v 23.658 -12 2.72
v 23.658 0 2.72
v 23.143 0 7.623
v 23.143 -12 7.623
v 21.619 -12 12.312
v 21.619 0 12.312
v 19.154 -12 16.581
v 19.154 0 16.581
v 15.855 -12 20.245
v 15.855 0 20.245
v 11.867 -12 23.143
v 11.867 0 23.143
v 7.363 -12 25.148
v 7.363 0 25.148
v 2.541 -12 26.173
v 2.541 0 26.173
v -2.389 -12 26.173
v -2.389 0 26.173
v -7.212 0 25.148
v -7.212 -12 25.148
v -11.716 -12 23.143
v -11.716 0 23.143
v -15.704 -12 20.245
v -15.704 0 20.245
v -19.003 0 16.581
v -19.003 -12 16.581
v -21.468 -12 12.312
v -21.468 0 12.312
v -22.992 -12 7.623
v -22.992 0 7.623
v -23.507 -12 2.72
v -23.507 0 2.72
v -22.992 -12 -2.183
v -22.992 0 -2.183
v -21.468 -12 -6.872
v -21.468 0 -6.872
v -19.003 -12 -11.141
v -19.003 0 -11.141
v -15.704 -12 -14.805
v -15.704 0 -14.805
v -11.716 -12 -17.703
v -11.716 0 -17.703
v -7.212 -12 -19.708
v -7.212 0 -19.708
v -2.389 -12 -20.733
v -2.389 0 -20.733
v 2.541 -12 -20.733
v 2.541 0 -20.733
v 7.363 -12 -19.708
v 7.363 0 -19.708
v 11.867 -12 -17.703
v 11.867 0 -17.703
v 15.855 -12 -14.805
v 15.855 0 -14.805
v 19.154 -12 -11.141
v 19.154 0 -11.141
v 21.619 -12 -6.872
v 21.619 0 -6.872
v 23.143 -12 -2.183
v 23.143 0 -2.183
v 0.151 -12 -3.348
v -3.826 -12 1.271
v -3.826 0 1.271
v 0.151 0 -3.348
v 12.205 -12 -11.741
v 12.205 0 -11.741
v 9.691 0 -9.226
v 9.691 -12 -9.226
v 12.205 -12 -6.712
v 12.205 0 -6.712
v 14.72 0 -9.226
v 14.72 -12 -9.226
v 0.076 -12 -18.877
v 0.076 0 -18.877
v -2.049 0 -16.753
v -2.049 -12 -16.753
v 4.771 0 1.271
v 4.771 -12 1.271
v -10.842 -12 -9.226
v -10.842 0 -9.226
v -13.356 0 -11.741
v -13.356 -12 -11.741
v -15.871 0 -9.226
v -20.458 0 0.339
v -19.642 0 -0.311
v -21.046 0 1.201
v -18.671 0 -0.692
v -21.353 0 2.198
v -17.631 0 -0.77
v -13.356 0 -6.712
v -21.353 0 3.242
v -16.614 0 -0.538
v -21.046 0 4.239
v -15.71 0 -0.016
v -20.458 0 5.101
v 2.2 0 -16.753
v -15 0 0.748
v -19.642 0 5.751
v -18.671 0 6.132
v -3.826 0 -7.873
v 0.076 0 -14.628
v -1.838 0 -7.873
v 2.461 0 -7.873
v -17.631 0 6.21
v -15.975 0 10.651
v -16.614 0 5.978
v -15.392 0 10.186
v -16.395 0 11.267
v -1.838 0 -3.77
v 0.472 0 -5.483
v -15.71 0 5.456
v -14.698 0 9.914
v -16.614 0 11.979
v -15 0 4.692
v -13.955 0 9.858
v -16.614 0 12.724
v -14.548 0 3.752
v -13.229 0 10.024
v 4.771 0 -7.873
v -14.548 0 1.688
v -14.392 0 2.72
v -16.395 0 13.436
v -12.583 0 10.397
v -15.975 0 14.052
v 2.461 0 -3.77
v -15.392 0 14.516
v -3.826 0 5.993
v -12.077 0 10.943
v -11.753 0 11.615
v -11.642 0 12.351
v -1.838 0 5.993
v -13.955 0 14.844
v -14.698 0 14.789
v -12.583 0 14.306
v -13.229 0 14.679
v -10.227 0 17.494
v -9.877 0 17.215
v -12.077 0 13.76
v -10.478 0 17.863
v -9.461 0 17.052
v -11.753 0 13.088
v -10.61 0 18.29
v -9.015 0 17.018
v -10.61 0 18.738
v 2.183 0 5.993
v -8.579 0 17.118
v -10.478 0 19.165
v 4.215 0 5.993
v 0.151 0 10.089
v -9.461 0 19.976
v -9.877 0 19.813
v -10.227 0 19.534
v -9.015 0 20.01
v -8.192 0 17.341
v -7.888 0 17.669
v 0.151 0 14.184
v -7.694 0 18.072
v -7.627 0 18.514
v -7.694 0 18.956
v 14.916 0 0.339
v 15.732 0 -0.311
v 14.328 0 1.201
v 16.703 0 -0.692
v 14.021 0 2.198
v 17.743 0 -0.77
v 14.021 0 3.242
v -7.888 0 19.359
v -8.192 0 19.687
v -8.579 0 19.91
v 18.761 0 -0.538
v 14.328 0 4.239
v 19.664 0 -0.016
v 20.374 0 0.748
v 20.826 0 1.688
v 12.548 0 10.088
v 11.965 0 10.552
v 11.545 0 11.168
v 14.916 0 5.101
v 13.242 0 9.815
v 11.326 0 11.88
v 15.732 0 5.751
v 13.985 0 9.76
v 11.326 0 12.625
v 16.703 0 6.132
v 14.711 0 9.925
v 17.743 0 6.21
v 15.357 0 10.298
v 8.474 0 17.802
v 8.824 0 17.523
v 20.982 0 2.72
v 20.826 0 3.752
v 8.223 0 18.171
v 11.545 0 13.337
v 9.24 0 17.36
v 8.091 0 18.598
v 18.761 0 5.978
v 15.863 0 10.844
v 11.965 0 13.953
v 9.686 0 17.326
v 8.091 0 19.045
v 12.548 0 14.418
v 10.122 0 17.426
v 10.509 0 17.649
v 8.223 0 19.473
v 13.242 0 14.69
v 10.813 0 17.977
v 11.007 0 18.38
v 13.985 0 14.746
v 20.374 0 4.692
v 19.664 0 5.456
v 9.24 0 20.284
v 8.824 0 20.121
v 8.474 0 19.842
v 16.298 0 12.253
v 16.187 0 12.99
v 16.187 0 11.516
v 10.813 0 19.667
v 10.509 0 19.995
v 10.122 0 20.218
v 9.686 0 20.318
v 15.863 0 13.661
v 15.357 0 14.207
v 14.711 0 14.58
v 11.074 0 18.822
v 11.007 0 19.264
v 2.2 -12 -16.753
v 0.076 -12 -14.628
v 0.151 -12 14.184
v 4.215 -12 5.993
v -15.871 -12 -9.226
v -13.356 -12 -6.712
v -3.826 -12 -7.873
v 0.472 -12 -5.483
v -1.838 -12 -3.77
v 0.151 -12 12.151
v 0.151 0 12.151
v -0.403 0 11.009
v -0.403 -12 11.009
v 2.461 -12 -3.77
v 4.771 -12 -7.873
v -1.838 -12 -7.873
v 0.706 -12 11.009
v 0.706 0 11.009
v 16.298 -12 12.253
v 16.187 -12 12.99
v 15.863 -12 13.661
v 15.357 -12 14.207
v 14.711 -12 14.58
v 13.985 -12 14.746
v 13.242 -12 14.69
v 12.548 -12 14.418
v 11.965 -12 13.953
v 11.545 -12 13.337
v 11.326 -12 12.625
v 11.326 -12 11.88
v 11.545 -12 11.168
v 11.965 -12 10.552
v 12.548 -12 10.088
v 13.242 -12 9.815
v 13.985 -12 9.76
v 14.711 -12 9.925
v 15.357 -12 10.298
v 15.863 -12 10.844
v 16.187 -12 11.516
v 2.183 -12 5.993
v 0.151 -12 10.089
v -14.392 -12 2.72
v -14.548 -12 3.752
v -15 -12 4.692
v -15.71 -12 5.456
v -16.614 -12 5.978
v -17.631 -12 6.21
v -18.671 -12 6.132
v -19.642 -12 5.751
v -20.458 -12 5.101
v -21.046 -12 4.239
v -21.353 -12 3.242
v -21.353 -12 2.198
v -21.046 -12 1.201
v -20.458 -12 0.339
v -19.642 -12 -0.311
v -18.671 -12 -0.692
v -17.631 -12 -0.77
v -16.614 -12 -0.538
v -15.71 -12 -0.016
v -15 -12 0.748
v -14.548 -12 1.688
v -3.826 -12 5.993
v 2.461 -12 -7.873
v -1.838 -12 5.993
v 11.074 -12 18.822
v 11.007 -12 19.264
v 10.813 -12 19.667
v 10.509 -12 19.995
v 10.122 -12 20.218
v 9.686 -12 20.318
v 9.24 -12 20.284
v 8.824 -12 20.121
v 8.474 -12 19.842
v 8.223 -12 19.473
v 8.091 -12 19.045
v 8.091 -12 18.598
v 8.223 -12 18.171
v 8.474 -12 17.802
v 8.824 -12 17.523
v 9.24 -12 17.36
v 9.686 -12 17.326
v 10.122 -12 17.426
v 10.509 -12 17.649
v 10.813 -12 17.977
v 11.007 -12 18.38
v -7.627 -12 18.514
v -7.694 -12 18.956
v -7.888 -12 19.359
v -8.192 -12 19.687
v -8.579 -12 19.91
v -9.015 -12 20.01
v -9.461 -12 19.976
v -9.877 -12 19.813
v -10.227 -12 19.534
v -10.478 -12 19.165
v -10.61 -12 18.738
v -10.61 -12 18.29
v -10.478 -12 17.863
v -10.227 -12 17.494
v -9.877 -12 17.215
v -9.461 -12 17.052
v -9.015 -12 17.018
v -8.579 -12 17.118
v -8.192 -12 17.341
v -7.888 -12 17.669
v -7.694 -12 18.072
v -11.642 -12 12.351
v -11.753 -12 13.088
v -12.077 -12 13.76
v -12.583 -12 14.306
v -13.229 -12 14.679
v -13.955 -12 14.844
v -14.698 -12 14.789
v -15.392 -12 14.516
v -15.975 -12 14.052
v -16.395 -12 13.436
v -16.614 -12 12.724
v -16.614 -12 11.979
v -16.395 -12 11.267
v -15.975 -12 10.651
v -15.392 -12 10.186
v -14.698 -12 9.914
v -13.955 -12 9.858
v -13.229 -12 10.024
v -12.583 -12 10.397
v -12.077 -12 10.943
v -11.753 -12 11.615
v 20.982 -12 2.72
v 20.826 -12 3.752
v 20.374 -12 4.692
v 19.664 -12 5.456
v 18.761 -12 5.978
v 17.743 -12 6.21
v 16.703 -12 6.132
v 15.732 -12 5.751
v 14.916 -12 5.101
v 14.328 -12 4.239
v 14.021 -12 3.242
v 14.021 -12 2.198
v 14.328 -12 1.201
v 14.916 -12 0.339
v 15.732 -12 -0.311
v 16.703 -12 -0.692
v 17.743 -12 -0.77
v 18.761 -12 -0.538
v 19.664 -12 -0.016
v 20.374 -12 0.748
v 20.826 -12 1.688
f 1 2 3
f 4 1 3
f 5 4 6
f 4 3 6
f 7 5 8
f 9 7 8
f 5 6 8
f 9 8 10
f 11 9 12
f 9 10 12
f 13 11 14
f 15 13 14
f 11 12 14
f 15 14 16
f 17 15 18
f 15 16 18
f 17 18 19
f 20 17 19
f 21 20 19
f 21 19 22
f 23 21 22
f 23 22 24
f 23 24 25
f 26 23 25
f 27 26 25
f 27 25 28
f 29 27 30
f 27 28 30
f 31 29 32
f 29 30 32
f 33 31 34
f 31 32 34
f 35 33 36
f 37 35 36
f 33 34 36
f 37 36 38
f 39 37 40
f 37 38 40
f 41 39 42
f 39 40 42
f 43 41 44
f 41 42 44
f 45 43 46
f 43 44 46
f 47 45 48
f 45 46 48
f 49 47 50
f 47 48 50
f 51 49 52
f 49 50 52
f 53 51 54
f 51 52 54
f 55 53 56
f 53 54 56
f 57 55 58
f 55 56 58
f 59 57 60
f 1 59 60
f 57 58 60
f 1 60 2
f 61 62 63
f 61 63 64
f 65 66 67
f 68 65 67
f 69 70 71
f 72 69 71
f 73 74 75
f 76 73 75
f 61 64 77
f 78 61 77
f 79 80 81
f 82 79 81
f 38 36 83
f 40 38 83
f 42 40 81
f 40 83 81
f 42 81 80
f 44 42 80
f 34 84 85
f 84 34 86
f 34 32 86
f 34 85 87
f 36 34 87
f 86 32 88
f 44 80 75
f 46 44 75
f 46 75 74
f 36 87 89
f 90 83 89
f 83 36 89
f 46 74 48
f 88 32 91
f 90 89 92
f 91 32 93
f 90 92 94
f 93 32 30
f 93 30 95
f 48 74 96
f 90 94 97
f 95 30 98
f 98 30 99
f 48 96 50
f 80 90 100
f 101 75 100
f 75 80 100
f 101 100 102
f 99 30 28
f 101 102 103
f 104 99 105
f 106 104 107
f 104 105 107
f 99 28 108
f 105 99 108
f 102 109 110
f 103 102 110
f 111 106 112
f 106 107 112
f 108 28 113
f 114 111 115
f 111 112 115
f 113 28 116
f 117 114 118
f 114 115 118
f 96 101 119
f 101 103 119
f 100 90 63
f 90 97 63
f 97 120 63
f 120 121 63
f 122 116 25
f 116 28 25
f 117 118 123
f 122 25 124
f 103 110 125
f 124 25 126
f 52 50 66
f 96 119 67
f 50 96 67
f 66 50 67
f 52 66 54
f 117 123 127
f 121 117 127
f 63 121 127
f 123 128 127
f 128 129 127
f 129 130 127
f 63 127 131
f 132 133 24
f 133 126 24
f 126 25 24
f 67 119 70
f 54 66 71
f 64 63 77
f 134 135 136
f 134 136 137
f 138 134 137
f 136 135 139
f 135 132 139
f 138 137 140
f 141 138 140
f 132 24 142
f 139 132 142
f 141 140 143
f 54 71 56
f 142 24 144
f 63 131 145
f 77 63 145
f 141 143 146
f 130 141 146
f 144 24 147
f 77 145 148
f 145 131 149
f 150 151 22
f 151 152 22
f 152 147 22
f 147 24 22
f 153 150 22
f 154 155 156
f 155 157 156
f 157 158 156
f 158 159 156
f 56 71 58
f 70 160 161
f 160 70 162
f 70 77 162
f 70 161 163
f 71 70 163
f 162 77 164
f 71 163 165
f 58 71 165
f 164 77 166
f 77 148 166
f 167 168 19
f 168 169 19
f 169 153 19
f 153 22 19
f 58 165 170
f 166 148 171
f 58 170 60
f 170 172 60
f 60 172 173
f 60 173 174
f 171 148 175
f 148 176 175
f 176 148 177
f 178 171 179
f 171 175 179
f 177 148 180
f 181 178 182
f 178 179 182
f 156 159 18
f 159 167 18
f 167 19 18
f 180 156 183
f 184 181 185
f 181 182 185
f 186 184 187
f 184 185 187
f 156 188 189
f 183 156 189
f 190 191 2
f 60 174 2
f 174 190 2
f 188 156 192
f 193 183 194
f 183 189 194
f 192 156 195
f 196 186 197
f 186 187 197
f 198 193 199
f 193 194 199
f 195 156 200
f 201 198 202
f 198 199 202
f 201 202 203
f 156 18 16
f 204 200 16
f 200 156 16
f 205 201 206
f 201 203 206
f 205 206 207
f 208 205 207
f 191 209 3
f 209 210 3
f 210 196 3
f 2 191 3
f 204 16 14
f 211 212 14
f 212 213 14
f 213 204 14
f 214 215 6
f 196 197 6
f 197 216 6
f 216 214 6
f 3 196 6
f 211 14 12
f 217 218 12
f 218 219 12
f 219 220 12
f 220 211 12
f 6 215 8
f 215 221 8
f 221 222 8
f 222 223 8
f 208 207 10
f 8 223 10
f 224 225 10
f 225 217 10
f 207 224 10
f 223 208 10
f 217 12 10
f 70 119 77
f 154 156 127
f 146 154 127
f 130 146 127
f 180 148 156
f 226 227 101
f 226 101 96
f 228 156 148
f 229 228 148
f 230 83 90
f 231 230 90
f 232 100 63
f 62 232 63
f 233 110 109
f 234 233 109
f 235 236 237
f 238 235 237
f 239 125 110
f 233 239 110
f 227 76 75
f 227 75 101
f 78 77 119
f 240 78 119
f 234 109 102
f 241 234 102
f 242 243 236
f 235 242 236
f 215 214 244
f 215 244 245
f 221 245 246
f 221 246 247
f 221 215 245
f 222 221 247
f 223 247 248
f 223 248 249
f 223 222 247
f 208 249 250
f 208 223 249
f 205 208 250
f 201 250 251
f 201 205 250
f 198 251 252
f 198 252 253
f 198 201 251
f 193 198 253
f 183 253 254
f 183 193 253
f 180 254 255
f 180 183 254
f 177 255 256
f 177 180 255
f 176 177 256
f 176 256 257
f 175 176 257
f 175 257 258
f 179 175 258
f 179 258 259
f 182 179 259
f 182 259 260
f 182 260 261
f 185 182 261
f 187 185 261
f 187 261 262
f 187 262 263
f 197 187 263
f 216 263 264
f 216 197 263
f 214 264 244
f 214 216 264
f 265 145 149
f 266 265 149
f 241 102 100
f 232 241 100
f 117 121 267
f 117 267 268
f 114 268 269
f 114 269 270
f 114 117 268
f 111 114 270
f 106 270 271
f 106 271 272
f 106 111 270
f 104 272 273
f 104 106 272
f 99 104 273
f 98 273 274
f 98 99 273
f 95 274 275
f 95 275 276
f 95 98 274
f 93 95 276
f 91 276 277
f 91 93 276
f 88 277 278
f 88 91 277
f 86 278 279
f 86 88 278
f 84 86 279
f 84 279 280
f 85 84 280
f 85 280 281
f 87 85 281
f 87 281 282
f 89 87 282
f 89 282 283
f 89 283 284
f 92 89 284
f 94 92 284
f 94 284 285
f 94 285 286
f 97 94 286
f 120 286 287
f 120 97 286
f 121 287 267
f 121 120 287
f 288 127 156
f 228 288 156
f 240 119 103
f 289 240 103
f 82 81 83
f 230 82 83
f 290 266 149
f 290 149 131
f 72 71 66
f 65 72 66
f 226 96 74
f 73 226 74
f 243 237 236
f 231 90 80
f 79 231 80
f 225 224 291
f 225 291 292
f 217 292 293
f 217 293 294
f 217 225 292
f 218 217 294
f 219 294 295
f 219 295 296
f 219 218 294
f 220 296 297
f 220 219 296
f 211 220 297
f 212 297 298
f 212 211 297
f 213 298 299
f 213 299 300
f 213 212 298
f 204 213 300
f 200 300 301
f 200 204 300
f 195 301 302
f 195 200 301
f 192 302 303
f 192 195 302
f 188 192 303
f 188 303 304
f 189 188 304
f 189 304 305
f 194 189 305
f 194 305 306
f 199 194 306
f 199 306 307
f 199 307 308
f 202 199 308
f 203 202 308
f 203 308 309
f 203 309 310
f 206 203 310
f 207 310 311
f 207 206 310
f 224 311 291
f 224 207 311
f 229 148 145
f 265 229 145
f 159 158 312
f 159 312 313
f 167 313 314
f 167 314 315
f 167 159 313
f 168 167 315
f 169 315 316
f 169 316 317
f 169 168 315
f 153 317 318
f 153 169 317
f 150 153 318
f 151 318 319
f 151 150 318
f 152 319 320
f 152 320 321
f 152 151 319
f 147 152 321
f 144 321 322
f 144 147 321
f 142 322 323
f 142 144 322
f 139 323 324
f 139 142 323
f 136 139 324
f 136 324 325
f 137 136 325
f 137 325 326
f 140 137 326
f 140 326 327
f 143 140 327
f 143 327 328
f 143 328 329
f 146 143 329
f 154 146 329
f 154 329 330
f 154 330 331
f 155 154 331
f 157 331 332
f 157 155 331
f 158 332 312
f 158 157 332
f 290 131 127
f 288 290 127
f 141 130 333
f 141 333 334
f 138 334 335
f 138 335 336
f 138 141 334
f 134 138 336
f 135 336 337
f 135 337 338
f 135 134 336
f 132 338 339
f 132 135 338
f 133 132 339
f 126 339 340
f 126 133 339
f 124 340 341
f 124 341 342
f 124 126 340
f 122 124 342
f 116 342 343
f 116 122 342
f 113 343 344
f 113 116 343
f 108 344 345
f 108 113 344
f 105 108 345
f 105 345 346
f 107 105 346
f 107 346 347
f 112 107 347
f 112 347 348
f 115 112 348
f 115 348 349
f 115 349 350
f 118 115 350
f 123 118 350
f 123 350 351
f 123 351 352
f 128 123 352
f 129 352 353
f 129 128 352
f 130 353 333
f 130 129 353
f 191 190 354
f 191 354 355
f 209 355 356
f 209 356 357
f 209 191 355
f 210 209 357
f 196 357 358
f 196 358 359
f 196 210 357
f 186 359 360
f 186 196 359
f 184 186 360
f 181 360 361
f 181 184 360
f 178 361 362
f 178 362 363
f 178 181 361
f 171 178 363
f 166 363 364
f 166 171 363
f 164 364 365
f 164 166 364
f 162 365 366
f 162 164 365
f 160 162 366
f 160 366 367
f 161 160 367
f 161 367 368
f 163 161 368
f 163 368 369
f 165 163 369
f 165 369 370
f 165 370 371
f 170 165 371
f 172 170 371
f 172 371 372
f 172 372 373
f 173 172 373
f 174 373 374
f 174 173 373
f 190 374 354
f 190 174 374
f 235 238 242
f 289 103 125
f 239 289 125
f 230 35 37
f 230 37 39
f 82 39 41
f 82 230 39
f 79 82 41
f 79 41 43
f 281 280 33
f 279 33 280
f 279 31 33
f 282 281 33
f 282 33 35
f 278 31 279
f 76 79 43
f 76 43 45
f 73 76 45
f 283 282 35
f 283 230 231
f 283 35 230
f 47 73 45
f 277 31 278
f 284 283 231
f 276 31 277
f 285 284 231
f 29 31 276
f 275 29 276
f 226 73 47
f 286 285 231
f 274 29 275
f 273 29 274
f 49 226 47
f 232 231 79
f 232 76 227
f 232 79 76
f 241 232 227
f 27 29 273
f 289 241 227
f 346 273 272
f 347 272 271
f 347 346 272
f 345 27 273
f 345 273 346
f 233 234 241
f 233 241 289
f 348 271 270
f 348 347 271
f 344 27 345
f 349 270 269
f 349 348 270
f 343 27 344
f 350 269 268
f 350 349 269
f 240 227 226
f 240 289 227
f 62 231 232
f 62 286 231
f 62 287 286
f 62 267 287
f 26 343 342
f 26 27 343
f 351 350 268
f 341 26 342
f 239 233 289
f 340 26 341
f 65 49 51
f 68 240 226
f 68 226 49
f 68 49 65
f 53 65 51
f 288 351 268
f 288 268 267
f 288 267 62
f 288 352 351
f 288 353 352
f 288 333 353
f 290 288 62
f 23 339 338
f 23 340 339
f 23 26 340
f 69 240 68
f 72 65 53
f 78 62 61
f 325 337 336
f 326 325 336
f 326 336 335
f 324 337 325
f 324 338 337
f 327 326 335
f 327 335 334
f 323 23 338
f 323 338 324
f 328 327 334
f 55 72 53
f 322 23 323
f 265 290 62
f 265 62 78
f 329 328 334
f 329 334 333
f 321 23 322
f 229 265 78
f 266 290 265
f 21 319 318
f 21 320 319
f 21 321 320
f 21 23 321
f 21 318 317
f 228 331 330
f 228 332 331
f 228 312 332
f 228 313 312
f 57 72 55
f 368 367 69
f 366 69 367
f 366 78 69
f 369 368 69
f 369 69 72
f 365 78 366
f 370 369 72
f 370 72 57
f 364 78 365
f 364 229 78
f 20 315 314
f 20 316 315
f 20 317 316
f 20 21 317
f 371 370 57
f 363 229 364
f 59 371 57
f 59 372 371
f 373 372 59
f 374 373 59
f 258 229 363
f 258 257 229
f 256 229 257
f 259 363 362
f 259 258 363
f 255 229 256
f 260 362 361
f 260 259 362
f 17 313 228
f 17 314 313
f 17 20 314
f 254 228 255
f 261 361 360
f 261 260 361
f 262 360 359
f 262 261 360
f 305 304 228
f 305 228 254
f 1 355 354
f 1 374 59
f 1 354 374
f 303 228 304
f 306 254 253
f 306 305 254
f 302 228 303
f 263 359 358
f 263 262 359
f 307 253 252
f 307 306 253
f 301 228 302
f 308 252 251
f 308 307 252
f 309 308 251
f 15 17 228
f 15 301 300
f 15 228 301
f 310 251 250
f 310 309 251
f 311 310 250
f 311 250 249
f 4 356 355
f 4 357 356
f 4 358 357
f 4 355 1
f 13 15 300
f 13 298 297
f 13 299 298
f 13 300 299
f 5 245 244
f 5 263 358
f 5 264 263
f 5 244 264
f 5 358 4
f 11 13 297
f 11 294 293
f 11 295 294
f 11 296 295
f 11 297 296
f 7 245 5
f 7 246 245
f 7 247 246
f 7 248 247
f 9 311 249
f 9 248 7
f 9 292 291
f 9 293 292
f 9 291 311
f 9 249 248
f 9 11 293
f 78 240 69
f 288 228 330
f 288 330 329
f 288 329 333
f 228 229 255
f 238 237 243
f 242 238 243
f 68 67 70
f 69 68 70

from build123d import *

# Parameters (mm, degrees)
F0_R     = 23.582491
F0_R_2   = 3.5
F0_R_3   = 2.5
F0_R_4   = 1.5
F1_DEPTH = 12


with BuildPart() as f1:
    # F0 (on Front) → F1 (new body)
    with BuildSketch(Plane.XZ):
        with Locations((0.075632, 2.719987)):
            Circle(F0_R)
        Polygon((-15.87052, -9.226178), (-13.356048, -6.711706), (-10.841576, -9.226178), (-13.356048, -11.74065), align=None, mode=Mode.SUBTRACT)
        Polygon((-2.048615, -16.752557), (0.075632, -14.62831), (2.199879, -16.752557), (0.075632, -18.876803), align=None, mode=Mode.SUBTRACT)
        Polygon((12.205255, -11.74065), (9.690783, -9.226178), (12.205255, -6.711706), (14.719727, -9.226178), align=None, mode=Mode.SUBTRACT)
        Polygon((-3.826466, -7.873054), (-3.826466, 1.270946), (0.151318, -3.34841), (4.770674, 1.270946), (4.770674, -7.873054), (2.460996, -7.873054), (2.460996, -3.770399), (0.472104, -5.483057), (-1.837574, -3.770399), (-1.837574, -7.873054), align=None, mode=Mode.SUBTRACT)
        with Locations((-17.892264, 2.719987)):
            Circle(F0_R_2, mode=Mode.SUBTRACT)
        with Locations((-14.142166, 12.351425)):
            Circle(F0_R_3, mode=Mode.SUBTRACT)
        with Locations((-9.126982, 18.514041)):
            Circle(F0_R_4, mode=Mode.SUBTRACT)
        Polygon((-3.826466, 5.99293), (0.151318, 14.184184), (4.215318, 5.99293), (2.183318, 5.99293), (0.151318, 10.088557), (-1.837574, 5.99293), align=None, mode=Mode.SUBTRACT)
        with Locations((17.48183, 2.719987)):
            Circle(F0_R_2, mode=Mode.SUBTRACT)
        with Locations((13.797834, 12.252635)):
            Circle(F0_R_3, mode=Mode.SUBTRACT)
        with Locations((9.574039, 18.821931)):
            Circle(F0_R_4, mode=Mode.SUBTRACT)
        Polygon((0.706093, 11.009061), (0.151318, 12.151482), (-0.403457, 11.009061), align=None)
    extrude(amount=F1_DEPTH)


solid = f1.part
